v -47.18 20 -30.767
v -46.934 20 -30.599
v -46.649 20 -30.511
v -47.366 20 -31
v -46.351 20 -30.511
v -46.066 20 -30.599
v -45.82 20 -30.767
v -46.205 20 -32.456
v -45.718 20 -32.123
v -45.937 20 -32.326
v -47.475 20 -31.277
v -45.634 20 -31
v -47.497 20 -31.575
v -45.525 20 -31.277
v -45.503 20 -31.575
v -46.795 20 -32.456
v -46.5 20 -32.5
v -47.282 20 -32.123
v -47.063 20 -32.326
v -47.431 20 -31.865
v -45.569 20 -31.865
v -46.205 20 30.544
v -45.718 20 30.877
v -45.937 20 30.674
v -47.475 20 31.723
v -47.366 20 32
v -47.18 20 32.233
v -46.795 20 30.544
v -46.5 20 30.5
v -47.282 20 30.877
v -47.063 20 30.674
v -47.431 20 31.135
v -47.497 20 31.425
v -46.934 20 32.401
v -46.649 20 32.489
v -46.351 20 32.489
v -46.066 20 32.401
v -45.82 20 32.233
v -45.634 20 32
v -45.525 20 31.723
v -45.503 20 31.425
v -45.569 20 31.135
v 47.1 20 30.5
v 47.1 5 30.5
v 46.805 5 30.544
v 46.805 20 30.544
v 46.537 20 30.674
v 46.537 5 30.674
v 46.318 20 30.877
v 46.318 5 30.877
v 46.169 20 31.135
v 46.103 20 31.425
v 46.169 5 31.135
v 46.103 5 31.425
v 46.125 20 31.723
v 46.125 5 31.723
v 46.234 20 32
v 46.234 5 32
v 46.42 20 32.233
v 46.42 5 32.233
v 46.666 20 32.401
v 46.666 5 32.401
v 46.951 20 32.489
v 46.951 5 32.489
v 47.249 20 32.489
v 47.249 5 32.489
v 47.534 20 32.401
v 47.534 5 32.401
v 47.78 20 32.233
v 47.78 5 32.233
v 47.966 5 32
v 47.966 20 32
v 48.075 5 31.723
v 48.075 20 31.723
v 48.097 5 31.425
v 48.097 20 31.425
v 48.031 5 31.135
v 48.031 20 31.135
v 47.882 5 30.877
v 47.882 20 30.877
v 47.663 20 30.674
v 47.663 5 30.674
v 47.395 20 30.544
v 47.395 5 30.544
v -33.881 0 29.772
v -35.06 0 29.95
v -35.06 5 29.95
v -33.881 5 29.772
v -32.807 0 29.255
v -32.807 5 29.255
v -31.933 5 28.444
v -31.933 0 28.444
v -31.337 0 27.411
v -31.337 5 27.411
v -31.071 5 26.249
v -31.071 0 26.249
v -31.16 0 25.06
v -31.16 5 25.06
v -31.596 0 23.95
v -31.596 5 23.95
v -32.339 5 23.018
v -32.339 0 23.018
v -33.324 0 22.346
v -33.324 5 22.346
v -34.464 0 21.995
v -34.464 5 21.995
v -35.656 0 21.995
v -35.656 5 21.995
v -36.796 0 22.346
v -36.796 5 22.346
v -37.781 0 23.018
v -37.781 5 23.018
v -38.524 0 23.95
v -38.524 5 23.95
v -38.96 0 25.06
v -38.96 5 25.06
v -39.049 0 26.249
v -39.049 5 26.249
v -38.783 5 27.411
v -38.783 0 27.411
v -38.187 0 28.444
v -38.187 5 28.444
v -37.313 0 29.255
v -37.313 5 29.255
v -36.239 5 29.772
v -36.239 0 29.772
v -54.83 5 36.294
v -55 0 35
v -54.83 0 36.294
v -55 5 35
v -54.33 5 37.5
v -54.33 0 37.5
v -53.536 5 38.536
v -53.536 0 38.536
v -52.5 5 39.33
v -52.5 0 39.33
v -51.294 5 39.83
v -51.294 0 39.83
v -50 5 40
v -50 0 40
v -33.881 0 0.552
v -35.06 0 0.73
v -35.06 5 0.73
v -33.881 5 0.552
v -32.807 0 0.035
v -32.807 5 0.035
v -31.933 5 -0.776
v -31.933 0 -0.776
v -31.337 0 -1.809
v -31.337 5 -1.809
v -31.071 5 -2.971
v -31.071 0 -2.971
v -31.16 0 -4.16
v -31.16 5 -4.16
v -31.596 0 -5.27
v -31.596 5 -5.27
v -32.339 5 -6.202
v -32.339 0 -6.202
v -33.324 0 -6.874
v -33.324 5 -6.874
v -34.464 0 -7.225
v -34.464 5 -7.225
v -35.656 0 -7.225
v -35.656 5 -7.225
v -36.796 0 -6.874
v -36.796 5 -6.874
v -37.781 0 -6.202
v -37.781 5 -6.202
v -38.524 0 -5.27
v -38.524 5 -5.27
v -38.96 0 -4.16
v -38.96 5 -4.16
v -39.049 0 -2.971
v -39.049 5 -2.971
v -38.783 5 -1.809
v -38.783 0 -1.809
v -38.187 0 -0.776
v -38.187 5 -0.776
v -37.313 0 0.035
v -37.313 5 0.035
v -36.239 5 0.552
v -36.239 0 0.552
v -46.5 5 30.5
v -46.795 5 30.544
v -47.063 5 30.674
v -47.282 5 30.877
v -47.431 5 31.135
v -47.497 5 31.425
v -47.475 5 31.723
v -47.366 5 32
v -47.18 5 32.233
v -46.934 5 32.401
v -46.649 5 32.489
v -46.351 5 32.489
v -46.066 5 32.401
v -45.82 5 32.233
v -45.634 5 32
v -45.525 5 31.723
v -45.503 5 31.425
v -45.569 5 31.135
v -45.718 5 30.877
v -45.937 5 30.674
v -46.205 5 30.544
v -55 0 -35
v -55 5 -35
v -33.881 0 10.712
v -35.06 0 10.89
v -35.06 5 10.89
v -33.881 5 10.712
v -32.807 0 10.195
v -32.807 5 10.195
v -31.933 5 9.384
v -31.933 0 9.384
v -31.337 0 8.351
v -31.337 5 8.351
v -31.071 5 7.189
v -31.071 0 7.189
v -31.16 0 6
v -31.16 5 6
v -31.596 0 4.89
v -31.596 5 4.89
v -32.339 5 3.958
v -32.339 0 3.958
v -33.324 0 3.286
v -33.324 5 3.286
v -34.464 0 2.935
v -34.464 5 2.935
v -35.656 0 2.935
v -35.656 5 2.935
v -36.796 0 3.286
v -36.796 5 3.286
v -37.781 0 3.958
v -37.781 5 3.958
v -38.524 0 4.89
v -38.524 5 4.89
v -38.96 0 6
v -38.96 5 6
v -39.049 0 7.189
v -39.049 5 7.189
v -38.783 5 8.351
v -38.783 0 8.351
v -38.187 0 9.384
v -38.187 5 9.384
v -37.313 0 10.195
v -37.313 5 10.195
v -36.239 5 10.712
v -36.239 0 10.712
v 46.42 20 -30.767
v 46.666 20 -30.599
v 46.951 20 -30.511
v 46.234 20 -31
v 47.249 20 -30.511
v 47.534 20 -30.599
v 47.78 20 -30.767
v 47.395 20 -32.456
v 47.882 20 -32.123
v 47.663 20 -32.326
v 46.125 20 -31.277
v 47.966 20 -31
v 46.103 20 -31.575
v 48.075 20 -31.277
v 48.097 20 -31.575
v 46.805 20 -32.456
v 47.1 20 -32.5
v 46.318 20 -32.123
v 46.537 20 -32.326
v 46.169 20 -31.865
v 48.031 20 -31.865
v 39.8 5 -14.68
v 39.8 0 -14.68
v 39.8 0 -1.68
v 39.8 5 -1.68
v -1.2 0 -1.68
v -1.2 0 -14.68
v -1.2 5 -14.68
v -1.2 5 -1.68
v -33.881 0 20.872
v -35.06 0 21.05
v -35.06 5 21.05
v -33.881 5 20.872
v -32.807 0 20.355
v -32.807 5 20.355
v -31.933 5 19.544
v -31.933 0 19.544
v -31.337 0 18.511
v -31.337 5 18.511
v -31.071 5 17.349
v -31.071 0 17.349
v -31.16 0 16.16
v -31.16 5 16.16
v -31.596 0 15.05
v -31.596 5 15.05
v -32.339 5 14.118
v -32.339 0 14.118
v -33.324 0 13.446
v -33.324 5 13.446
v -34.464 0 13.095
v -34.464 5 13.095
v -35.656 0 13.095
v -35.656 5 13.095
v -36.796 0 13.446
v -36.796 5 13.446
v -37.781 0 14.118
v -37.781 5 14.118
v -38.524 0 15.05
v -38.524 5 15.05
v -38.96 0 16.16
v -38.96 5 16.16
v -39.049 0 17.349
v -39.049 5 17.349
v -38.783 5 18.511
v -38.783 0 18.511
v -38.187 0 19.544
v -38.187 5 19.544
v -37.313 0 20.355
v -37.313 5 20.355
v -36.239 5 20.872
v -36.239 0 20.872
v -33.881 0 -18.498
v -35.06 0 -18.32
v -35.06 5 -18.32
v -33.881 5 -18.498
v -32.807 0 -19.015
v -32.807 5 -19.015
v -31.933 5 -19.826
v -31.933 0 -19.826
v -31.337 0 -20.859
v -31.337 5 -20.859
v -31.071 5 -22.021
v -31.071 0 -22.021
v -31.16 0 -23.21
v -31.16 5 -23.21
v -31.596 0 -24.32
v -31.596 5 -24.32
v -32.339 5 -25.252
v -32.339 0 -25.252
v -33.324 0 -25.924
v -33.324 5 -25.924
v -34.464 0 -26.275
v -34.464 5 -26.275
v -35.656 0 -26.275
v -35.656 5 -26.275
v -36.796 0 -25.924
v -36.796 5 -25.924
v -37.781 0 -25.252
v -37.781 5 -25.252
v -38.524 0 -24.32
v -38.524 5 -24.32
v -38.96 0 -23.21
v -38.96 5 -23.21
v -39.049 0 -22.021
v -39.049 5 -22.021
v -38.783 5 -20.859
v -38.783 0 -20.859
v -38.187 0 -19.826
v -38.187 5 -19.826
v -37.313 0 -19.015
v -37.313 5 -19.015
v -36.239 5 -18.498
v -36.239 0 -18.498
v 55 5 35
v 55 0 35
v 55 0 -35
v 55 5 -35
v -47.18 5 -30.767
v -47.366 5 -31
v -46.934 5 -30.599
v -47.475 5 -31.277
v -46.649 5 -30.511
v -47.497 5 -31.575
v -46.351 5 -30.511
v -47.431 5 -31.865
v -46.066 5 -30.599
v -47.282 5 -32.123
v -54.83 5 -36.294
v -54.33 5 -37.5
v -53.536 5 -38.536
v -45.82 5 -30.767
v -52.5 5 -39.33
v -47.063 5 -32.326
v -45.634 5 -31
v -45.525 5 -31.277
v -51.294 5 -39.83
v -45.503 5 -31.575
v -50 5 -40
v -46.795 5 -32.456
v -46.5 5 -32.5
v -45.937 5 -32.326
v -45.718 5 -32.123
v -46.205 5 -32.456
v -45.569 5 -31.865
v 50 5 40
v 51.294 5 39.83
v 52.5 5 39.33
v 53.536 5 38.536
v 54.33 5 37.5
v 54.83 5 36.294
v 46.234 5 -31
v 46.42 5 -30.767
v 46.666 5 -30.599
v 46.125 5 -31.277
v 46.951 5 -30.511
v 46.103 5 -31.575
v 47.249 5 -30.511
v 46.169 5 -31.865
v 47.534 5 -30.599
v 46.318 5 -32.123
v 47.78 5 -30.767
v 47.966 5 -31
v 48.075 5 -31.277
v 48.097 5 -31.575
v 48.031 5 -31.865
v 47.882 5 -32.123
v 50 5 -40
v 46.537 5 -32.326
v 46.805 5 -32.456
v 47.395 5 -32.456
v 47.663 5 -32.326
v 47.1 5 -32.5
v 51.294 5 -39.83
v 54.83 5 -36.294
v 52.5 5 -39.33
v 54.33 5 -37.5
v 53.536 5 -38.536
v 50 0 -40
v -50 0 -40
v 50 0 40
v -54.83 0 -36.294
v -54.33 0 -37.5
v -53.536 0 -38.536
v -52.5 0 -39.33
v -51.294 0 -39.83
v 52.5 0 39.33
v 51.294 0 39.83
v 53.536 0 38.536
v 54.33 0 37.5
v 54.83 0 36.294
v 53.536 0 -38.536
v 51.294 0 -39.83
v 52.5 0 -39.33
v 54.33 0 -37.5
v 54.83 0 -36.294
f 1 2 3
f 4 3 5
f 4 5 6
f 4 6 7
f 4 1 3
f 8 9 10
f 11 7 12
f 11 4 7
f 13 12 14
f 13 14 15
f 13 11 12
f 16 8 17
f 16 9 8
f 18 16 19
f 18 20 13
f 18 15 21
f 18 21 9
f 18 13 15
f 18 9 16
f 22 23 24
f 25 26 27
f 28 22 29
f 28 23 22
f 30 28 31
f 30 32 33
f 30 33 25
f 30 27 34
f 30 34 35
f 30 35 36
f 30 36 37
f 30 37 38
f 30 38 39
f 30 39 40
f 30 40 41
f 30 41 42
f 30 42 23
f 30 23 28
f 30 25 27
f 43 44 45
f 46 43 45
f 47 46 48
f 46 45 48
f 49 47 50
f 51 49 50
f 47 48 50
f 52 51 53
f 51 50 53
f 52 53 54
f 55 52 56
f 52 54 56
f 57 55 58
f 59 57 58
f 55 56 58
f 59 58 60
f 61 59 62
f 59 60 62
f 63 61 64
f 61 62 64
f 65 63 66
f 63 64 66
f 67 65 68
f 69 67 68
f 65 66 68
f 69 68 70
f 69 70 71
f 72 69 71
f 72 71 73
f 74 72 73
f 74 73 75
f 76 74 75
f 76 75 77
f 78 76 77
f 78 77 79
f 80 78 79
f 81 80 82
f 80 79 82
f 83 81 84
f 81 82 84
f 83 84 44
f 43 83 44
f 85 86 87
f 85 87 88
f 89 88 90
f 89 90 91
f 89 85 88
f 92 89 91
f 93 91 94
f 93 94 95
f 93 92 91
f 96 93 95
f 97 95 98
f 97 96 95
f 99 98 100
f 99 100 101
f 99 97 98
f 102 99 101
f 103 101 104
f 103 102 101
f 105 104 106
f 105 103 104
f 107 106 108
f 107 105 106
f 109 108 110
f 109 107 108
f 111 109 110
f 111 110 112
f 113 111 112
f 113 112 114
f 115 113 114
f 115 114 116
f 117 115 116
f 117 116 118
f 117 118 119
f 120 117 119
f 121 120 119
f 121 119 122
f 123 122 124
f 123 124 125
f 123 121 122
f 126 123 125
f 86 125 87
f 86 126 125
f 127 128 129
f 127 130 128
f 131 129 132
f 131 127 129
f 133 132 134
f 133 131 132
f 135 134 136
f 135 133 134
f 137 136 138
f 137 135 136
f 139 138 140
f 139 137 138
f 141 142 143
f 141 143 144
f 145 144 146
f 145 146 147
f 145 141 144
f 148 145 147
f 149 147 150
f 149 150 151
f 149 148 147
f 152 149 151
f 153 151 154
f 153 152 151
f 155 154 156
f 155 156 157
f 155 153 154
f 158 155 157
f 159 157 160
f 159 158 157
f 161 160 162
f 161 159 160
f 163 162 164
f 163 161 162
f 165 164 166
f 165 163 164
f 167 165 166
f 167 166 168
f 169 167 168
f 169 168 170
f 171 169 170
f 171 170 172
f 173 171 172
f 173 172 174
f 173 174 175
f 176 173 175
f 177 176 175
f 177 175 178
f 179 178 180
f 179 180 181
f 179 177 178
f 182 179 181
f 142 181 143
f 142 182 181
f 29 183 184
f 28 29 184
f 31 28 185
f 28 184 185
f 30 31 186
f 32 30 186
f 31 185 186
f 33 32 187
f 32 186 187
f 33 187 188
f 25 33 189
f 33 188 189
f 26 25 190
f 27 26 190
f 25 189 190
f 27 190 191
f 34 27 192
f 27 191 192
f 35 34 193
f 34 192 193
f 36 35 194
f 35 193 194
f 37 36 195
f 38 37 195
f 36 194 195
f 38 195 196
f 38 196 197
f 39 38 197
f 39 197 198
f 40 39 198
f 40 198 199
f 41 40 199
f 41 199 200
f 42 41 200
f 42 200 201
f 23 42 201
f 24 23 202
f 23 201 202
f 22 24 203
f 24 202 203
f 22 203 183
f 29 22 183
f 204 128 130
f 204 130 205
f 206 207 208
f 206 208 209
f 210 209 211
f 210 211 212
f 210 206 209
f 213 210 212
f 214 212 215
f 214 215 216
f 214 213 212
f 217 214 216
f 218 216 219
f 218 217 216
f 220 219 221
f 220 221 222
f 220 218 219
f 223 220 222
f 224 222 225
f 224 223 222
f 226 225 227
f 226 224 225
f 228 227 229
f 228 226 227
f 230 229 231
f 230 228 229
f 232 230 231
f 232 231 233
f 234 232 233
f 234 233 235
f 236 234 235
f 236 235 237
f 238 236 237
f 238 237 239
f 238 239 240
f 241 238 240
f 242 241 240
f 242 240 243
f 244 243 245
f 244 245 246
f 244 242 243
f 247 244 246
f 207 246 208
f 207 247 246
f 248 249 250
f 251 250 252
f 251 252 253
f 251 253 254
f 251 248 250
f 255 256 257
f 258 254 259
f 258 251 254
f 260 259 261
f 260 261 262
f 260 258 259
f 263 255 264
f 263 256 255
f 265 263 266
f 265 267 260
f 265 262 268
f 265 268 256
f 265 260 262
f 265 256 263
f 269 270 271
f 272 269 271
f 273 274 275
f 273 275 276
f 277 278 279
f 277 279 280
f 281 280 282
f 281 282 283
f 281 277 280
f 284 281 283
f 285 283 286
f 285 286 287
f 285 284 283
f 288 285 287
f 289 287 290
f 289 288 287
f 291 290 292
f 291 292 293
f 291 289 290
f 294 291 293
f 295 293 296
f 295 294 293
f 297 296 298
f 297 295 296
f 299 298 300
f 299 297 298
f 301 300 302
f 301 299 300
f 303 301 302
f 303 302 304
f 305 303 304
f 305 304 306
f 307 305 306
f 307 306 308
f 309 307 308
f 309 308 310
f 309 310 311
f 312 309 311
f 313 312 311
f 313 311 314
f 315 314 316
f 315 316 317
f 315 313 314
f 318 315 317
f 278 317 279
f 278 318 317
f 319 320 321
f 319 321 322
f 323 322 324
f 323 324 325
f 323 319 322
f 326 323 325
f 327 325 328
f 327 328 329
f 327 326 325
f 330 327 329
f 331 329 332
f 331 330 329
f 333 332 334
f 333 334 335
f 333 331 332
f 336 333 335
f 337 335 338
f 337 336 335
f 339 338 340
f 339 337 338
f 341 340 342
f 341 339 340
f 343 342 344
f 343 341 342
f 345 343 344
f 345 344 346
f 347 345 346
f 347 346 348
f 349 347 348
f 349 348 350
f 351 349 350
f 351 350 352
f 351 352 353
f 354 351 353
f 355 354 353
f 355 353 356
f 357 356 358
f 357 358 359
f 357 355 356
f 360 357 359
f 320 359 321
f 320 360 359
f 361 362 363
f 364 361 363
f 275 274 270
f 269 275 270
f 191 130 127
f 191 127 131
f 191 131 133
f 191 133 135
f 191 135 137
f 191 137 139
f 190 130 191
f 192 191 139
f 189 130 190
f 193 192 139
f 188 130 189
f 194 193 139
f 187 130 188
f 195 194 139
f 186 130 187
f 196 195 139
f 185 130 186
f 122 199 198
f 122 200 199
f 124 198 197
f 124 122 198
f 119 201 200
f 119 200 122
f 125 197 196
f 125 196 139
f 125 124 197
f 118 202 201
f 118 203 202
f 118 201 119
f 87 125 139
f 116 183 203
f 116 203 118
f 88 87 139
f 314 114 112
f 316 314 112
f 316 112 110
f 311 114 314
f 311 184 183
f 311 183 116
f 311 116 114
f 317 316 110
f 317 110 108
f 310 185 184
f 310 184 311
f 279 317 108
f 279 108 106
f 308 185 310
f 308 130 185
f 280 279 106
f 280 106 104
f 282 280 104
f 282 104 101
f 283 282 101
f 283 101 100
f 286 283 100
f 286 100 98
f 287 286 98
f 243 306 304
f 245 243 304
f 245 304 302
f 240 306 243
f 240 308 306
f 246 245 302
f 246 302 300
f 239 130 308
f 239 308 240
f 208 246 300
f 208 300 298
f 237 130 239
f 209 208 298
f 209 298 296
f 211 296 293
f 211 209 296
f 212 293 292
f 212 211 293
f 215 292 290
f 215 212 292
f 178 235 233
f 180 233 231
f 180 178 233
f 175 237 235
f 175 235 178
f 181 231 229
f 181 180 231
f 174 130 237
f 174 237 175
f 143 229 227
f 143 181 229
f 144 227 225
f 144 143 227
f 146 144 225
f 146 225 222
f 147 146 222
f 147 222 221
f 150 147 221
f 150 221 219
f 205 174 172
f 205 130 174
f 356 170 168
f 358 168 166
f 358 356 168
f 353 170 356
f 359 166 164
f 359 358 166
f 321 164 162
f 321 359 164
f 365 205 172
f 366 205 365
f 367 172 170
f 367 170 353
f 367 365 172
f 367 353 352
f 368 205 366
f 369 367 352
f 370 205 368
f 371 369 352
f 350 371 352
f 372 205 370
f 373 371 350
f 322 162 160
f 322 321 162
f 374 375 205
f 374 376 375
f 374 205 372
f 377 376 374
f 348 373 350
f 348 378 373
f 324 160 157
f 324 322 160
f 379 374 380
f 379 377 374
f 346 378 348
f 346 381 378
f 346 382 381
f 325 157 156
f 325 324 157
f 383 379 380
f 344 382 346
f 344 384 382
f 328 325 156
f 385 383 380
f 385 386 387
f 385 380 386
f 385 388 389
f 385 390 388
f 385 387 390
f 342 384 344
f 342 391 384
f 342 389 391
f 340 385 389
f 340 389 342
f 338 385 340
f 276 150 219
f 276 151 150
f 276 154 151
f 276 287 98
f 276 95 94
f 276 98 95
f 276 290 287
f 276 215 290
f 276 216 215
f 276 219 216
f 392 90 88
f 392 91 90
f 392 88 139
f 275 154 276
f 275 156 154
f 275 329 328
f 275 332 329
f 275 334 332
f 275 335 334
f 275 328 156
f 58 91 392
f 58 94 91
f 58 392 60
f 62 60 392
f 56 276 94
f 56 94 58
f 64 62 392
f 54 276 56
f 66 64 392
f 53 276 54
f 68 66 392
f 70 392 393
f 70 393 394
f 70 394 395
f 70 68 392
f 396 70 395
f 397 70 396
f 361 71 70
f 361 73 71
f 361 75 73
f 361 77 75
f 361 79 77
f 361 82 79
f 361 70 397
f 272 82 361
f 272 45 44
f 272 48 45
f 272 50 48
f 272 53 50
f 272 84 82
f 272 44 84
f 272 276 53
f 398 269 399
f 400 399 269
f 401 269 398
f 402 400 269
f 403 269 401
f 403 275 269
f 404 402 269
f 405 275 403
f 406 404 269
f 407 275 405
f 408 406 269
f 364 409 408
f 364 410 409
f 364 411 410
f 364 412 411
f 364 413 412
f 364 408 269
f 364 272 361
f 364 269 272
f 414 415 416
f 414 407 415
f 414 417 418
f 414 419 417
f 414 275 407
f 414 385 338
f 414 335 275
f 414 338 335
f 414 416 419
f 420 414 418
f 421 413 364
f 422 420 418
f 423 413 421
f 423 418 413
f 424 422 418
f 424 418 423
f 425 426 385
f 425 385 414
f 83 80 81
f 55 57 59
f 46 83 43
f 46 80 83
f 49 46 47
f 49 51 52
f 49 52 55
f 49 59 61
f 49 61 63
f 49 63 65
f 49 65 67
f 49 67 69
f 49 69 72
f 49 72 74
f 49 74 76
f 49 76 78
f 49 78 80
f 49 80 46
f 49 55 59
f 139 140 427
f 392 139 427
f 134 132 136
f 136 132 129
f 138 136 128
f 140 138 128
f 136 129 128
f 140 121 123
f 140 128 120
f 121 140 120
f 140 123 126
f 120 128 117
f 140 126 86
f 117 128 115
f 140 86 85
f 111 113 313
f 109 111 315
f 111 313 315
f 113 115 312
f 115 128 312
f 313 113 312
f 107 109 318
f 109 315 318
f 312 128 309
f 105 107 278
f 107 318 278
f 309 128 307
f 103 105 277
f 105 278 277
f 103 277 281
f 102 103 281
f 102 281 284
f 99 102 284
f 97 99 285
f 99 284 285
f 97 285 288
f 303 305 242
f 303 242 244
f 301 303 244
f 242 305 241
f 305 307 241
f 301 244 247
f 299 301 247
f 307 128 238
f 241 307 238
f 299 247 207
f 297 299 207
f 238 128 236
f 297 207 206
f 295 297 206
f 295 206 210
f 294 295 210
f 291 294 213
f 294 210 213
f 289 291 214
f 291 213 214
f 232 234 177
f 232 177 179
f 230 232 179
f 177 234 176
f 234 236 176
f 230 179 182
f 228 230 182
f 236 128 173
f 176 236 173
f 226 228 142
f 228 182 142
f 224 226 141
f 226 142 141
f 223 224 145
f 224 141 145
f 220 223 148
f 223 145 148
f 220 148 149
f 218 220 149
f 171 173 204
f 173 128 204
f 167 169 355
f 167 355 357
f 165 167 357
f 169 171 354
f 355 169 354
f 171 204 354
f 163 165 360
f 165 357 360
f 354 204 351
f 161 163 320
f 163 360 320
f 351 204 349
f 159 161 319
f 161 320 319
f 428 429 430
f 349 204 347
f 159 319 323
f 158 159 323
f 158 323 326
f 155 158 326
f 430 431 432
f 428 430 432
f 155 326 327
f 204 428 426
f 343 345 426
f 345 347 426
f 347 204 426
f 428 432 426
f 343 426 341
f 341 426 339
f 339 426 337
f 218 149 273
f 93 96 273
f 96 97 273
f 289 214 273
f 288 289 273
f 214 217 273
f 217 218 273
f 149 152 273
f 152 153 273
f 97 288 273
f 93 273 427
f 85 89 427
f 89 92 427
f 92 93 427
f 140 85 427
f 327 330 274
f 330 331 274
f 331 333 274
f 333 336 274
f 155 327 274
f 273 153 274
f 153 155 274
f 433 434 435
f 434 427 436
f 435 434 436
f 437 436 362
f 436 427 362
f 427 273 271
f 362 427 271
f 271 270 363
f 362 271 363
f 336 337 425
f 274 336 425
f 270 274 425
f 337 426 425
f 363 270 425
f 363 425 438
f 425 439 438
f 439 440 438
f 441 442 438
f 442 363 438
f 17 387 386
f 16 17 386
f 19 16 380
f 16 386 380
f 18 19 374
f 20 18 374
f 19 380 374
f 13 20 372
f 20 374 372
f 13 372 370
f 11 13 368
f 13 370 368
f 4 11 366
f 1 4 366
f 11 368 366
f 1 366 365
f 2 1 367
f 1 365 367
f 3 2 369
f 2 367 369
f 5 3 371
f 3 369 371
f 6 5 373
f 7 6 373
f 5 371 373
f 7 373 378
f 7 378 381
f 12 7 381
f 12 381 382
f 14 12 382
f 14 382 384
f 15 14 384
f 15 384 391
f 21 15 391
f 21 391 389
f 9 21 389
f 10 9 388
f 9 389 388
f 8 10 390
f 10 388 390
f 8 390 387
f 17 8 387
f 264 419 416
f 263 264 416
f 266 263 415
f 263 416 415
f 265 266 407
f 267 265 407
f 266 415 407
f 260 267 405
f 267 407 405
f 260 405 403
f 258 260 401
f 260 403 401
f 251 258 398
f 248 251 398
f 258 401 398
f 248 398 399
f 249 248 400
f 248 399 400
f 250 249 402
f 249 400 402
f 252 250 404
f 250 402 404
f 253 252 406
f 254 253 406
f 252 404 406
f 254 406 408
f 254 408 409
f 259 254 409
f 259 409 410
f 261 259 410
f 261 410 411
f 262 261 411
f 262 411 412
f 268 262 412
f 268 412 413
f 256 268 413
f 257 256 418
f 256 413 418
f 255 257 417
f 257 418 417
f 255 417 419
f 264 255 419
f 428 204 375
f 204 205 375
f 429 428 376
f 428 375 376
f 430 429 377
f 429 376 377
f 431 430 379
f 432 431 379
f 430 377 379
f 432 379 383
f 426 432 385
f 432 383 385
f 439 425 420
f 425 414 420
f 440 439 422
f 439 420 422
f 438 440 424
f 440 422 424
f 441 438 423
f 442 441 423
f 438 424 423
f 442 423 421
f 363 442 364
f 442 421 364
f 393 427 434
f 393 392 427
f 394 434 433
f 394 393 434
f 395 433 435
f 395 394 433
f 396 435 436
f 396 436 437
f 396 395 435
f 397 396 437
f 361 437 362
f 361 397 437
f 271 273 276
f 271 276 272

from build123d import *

# Parameters (mm, degrees)
SKETCH1_W           = 110
SKETCH1_H           = 80
SKETCH1_R           = 4
BOSS_EXTRUDE1_DEPTH = 5
SKETCH2_R           = 1
BOSS_EXTRUDE2_DEPTH = 15
FILLET1_R           = 5
SKETCH3_W           = 41
SKETCH3_H           = 13
CUT_EXTRUDE2_DEPTH  = 5


with BuildPart() as part:
    # Sketch1 → Boss-Extrude1 (new body)
    with BuildSketch(Plane(origin=(0, 0, 0), x_dir=(1, 0, 0), z_dir=(0, 1, 0))):
        Rectangle(SKETCH1_W, SKETCH1_H)
        with Locations(Location((-35.06, 22.32, 0), (0, 0, 270))):
            Circle(SKETCH1_R, mode=Mode.SUBTRACT)
        with Locations(Location((-35.06, 3.27, 0), (0, 0, 270))):
            Circle(SKETCH1_R, mode=Mode.SUBTRACT)
        with Locations(Location((-35.06, -6.89, 0), (0, 0, 270))):
            Circle(SKETCH1_R, mode=Mode.SUBTRACT)
        with Locations(Location((-35.06, -17.05, 0), (0, 0, 270))):
            Circle(SKETCH1_R, mode=Mode.SUBTRACT)
        with Locations(Location((-35.06, -25.95, 0), (0, 0, 270))):
            Circle(SKETCH1_R, mode=Mode.SUBTRACT)
    extrude(amount=BOSS_EXTRUDE1_DEPTH)

    # Sketch2 → Boss-Extrude2 (add)
    with BuildSketch(Plane(origin=(0, 5, 0), x_dir=(1, 0, 0), z_dir=(0, 1, 0))):
        with Locations(Location((47.1, 31.5, 0), (0, 0, 90))):
            Circle(SKETCH2_R)
        with Locations(Location((47.1, -31.5, 0), (0, 0, 90))):
            Circle(SKETCH2_R)
        with Locations(Location((-46.5, 31.5, 0), (0, 0, 90))):
            Circle(SKETCH2_R)
        with Locations(Location((-46.5, -31.5, 0), (0, 0, 90))):
            Circle(SKETCH2_R)
    extrude(amount=BOSS_EXTRUDE2_DEPTH)

    # Fillet1
    fillet1_edges = [part.edges().sort_by_distance(p)[0] for p in [
        (55, 2.5, 40),
        (-55, 2.5, 40),
        (-55, 2.5, -40),
        (55, 2.5, -40),
    ]]
    fillet(fillet1_edges, radius=FILLET1_R)

    # Sketch3 → Cut-Extrude2 (cut)
    with BuildSketch(Plane.XZ):
        with Locations((19.3, -8.18)):
            Rectangle(SKETCH3_W, SKETCH3_H)
    extrude(amount=-CUT_EXTRUDE2_DEPTH, mode=Mode.SUBTRACT)


solid = part.part
